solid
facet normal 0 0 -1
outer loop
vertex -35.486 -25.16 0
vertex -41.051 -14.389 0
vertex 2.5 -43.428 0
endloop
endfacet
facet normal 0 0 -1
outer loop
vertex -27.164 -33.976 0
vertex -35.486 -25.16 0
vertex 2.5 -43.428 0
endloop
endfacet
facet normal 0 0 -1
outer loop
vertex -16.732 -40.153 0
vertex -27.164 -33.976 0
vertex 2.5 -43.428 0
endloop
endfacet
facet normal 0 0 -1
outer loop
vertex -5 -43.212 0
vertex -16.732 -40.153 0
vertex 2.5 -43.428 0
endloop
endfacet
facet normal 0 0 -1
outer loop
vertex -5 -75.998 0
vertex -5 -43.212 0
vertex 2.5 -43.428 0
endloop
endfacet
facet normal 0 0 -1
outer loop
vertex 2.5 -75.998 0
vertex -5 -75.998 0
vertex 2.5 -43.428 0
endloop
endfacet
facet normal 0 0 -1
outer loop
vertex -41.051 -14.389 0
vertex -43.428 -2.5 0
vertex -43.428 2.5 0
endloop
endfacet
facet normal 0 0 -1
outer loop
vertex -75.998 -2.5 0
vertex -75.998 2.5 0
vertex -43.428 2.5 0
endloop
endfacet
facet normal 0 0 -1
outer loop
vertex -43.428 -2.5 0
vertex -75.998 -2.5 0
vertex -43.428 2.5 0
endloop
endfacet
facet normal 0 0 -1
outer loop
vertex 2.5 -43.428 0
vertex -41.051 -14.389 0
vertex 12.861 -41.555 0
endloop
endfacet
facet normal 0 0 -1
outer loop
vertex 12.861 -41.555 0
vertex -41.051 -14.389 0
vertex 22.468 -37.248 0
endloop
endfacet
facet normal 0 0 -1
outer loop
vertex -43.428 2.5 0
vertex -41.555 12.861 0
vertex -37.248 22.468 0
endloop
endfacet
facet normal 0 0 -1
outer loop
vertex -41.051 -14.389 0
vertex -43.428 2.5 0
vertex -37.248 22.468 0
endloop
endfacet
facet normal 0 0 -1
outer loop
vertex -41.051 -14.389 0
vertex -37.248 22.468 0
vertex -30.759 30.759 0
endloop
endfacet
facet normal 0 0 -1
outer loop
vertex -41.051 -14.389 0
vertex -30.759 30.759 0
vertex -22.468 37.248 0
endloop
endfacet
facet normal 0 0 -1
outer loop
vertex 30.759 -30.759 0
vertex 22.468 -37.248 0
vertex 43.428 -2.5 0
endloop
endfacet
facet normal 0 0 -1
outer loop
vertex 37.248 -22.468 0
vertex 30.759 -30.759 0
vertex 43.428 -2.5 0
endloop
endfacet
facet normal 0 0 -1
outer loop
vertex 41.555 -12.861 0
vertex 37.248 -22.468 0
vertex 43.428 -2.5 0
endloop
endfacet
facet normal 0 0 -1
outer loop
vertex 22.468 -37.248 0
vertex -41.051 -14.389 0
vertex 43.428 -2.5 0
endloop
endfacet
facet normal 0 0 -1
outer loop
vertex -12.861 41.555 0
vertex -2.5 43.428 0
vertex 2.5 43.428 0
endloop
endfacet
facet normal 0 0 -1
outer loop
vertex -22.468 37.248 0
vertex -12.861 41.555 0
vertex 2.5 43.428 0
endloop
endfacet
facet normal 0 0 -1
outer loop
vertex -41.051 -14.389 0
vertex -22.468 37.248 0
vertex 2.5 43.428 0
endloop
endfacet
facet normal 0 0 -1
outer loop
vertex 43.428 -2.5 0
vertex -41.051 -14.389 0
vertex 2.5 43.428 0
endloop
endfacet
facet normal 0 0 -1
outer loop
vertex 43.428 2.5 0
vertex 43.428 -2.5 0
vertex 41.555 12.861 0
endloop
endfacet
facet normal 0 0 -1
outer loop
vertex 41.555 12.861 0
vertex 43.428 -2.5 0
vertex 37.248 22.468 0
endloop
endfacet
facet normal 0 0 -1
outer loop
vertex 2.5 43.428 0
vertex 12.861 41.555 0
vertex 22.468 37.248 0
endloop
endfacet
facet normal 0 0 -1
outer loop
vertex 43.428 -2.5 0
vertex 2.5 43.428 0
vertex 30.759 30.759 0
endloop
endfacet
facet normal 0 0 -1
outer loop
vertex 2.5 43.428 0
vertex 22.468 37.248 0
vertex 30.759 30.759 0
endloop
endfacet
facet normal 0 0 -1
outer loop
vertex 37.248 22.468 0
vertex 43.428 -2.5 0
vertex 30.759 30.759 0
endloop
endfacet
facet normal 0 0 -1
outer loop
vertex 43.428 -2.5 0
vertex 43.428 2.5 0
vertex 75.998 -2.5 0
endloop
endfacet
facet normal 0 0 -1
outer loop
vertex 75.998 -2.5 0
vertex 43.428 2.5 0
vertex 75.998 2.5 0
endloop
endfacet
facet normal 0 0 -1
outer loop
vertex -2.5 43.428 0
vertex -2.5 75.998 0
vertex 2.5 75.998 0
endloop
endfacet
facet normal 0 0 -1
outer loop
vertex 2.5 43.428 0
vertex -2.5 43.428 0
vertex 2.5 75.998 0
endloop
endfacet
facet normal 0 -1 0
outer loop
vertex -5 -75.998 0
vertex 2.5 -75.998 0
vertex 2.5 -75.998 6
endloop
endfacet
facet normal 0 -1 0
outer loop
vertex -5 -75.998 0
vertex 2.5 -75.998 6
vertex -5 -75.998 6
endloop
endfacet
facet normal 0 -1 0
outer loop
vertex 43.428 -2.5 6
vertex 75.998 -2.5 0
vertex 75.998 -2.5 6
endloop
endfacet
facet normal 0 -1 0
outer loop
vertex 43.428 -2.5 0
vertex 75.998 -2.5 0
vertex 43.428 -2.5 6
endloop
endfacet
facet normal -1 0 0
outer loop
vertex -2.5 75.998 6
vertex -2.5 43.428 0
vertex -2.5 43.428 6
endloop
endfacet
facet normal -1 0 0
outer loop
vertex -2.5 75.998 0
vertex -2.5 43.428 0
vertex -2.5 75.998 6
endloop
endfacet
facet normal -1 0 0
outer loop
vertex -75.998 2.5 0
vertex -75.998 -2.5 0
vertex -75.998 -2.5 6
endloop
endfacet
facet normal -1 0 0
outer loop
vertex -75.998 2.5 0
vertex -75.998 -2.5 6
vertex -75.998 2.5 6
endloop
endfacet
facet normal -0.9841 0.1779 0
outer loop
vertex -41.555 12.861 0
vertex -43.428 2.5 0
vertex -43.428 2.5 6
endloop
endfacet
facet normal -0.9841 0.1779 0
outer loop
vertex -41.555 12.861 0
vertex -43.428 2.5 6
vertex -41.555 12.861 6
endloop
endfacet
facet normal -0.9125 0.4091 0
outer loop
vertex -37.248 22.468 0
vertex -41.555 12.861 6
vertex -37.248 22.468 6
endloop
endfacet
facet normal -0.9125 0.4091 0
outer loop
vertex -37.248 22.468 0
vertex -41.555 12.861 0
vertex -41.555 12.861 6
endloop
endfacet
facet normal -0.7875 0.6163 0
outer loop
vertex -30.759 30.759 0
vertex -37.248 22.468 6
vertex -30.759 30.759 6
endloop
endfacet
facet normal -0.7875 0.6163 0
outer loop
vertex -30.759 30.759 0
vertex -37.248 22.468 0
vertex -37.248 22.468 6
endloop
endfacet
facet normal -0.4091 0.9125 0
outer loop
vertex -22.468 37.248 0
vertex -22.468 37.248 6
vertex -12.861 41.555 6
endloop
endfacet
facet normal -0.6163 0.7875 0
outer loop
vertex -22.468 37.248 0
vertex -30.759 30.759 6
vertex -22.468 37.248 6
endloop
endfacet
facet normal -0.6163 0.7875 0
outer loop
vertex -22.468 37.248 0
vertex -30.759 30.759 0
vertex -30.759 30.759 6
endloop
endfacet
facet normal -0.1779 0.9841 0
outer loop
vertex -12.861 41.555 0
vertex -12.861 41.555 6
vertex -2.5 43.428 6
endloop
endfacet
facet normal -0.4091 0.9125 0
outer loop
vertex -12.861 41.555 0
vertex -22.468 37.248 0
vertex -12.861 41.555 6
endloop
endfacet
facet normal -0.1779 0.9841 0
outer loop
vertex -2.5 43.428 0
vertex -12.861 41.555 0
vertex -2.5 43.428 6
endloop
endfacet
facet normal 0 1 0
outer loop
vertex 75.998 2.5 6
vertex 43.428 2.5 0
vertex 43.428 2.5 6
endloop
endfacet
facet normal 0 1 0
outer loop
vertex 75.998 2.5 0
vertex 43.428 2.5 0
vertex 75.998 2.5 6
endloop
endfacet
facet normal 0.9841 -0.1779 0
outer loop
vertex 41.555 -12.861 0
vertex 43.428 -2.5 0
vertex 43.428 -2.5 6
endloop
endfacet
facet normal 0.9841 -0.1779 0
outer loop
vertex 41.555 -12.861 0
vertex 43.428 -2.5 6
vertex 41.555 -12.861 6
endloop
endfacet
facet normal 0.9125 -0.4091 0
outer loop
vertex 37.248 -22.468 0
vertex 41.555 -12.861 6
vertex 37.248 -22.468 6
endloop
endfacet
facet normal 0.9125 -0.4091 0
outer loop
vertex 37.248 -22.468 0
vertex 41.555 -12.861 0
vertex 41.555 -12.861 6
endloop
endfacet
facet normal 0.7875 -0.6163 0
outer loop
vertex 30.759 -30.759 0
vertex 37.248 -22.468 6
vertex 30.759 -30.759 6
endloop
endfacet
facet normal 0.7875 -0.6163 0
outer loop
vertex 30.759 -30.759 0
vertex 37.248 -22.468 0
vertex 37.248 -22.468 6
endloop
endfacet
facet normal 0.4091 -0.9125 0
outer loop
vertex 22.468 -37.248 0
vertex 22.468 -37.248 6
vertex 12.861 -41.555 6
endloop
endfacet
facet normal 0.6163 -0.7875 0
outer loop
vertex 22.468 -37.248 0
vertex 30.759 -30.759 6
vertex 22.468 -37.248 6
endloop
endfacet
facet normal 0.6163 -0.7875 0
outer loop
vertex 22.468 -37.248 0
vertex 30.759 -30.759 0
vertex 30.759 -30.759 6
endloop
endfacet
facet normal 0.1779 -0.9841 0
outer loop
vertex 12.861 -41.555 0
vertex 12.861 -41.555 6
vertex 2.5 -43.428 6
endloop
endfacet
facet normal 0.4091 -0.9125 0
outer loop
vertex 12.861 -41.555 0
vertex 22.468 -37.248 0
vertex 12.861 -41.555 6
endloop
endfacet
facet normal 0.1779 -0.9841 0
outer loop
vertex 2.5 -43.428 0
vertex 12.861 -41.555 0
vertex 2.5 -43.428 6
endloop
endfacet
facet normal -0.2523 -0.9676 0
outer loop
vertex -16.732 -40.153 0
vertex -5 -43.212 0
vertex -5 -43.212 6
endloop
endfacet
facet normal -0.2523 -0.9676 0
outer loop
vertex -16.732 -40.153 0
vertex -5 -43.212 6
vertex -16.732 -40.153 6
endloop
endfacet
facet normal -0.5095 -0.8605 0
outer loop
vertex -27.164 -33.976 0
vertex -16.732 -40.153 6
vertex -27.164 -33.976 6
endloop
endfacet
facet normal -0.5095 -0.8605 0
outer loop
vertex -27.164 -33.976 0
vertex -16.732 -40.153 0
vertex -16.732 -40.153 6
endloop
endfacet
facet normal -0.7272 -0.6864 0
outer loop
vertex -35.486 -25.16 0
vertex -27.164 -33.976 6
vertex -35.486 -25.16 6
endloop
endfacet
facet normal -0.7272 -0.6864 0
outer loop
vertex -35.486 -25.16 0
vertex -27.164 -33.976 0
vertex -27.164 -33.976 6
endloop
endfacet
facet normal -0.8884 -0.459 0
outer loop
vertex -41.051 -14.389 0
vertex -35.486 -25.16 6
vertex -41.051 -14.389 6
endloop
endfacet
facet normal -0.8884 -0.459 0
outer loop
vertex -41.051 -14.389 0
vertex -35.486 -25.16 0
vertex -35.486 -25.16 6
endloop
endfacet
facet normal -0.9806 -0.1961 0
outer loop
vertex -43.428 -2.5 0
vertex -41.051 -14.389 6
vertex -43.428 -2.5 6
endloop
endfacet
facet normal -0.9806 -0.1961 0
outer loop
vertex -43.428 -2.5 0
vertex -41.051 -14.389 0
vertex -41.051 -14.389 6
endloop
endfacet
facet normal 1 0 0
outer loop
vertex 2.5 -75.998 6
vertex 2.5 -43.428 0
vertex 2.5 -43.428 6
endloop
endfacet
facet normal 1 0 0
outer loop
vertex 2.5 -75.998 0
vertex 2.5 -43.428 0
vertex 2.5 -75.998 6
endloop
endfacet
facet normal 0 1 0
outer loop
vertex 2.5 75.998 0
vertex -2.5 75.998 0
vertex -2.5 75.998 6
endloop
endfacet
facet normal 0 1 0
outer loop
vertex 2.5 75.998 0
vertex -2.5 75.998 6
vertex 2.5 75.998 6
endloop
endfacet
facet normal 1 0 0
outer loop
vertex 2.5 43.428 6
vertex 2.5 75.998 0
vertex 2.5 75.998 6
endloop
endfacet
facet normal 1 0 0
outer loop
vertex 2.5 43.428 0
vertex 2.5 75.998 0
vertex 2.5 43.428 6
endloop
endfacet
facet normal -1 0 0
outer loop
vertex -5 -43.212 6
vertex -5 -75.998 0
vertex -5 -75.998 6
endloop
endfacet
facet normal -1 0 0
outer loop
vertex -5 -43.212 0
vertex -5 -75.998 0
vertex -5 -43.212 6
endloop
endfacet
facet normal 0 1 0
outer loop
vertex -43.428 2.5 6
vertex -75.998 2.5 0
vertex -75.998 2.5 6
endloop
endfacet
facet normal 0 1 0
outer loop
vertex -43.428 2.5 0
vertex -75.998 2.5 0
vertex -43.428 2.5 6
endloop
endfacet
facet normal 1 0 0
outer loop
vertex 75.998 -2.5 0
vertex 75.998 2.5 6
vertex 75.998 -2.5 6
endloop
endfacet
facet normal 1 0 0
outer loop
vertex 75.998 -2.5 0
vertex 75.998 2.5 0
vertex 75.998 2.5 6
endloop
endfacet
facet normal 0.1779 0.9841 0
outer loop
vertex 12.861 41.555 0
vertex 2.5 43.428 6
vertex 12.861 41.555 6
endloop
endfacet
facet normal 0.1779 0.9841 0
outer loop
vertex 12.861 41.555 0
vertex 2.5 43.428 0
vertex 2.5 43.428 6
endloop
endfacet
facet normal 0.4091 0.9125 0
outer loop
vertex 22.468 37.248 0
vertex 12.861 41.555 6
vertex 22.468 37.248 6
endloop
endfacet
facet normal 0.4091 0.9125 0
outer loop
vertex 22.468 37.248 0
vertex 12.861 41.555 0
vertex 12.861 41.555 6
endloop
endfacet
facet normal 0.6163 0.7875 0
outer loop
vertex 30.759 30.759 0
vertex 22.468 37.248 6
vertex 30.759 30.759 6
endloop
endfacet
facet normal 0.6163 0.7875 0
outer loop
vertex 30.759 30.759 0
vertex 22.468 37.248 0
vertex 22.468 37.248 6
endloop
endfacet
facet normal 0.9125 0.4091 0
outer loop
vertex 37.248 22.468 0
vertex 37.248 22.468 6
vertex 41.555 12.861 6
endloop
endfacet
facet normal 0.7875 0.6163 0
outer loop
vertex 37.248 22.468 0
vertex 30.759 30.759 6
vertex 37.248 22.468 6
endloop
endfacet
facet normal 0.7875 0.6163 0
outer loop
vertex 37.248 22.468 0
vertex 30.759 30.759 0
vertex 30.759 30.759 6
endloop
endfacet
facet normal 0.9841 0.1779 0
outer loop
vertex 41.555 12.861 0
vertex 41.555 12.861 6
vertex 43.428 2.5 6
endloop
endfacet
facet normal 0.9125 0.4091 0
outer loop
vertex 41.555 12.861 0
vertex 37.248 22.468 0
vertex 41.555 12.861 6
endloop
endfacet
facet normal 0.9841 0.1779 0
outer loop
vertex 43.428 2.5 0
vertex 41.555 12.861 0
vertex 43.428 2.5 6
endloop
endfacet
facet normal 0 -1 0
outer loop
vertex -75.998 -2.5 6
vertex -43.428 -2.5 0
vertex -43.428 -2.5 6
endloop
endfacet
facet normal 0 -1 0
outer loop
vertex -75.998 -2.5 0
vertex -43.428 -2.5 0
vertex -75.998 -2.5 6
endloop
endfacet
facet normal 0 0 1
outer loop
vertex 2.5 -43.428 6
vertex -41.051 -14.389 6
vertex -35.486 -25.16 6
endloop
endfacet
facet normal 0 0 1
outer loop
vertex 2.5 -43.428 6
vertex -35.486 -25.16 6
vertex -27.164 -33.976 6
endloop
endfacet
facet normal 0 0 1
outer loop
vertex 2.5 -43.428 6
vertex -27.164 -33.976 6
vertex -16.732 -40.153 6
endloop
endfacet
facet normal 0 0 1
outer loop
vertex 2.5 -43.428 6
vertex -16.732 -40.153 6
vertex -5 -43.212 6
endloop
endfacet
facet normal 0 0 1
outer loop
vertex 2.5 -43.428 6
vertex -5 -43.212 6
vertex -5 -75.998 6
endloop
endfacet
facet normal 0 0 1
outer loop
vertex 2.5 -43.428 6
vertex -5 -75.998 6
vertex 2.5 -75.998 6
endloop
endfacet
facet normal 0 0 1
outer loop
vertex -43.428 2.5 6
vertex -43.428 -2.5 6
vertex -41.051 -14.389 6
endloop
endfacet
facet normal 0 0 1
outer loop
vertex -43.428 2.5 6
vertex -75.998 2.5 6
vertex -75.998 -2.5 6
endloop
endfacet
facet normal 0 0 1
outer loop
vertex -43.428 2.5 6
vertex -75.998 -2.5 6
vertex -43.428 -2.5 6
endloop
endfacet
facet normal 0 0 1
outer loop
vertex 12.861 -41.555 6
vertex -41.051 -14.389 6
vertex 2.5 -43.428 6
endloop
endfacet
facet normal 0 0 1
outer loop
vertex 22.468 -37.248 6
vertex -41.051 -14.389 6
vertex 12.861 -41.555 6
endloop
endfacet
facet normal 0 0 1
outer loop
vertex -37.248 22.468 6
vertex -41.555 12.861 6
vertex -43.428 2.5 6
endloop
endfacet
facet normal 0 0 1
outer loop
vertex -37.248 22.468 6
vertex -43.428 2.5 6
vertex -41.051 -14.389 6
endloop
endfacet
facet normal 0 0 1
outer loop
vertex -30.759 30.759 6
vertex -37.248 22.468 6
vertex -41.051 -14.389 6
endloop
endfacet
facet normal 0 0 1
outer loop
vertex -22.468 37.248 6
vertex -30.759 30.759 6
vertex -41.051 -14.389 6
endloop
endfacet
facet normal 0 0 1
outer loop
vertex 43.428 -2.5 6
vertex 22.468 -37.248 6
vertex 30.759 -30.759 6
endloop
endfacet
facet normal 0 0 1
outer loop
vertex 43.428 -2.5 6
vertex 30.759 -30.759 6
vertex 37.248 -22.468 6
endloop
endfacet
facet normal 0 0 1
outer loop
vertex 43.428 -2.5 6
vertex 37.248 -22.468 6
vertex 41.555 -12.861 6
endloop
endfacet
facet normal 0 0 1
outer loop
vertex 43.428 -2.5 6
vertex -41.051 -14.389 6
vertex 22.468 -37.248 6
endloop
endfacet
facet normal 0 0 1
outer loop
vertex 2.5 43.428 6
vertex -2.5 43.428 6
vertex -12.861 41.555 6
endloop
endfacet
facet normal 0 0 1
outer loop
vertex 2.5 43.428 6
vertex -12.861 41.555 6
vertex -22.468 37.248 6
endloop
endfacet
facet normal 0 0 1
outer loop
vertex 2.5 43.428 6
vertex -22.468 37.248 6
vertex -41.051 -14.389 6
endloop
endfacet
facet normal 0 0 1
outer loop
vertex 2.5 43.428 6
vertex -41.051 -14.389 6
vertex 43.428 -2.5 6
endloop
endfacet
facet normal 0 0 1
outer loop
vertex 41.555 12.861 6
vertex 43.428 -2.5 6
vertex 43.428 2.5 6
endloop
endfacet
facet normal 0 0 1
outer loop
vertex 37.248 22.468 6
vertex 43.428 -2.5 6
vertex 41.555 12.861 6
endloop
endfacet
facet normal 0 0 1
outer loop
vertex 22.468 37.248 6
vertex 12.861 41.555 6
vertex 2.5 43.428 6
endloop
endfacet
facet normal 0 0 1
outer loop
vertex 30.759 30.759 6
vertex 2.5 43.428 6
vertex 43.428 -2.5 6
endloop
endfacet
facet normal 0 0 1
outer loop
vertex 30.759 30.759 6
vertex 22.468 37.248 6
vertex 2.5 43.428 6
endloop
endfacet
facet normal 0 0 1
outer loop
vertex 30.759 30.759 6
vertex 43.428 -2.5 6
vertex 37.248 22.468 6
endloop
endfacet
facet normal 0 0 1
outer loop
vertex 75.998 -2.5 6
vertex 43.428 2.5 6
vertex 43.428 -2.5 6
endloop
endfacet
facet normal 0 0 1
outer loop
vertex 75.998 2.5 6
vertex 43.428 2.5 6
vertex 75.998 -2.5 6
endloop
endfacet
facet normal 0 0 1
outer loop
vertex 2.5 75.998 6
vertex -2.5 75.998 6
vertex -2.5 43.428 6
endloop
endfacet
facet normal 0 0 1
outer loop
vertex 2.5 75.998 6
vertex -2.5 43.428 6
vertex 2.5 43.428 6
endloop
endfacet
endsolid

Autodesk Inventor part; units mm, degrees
ref_plane "YZ Plane" through (0, 0, 0) normal (1, 0, 0) x (0, 1, 0)
ref_plane "XZ Plane" through (0, 0, 0) normal (0, 1, 0) x (-1, 0, 0)
ref_plane "XY Plane" through (0, 0, 0) normal (0, 0, 1) x (1, 0, 0)
sketch "Szkic1" plane through (0, 0, 0) normal (0, 0, 1) x (1, 0, 0)
  circle A0 centre (0, 0) radius 43.5 construction
  line L0 (0, 43.5) -> (2.5, 43.5) construction
  line L1 (2.5, 43.5) -> (2.5, 75.9975) construction
  line L2 (2.5, 75.9975) -> (0, 75.9975) construction
  line L3 (0, 75.9975) -> (0, 43.5) construction
  line L4 (0, -43.5) -> (2.5, -43.5) construction
  line L5 (2.5, -43.5) -> (2.5, -75.9975) construction
  line L6 (2.5, -75.9975) -> (0, -75.9975) construction
  line L7 (43.5, 0) -> (75.9975, 0) construction
  line L8 (75.9975, 0) -> (75.9975, 2.5) construction
  line L9 (75.9975, 2.5) -> (43.5, 2.5) construction
  line L10 (43.5, 2.5) -> (43.5, 0) construction
  line L11 (43.5, 0) -> (75.9975, 0) construction
  line L12 (75.9975, 0) -> (75.9975, -2.5) construction
  line L13 (75.9975, -2.5) -> (43.5, -2.5) construction
  line L14 (43.5, -2.5) -> (43.5, 0) construction
  line L15 (0, 43.5) -> (-2.5, 43.5) construction
  line L16 (-2.5, 43.5) -> (-2.5, 75.9975) construction
  line L17 (-2.5, 75.9975) -> (0, 75.9975) construction
  line L18 (0, 75.9975) -> (0, 43.5) construction
  line L19 (0, -43.5) -> (-5, -43.5) construction
  line L20 (-5, -43.5) -> (-5, -75.9975) construction
  line L21 (-5, -75.9975) -> (-2.5, -75.9975) construction
  line L22 (-43.5, 0) -> (-75.9975, 0) construction
  line L23 (-75.9975, 0) -> (-75.9975, -2.5) construction
  line L24 (-75.9975, -2.5) -> (-43.5, -2.5) construction
  line L25 (-43.5, -2.5) -> (-43.5, 0) construction
  line L26 (-43.5, 0) -> (-75.9975, 0) construction
  line L27 (-75.9975, 0) -> (-75.9975, 2.5) construction
  line L28 (-75.9975, 2.5) -> (-43.5, 2.5) construction
  line L29 (-43.5, 2.5) -> (-43.5, 0) construction
  arc A1 (2.5, -43.4281) -> (43.4281, -2.5) centre (0, 0) ccw
  arc A2 (43.4281, 2.5) -> (2.5, 43.4281) centre (0, 0) ccw
  arc A3 (-43.4281, -2.5) -> (-5, -43.2117) centre (0, 0) ccw
  arc A4 (-2.5, 43.4281) -> (-43.4281, 2.5) centre (0, 0) ccw
  line L30 (-2.5, 43.4281) -> (-2.5, 75.9975)
  line L31 (-2.5, 75.9975) -> (2.5, 75.9975)
  line L32 (2.5, 75.9975) -> (2.5, 43.4281)
  line L33 (43.4281, 2.5) -> (75.9975, 2.5)
  line L34 (75.9975, 2.5) -> (75.9975, -2.5)
  line L35 (75.9975, -2.5) -> (43.4281, -2.5)
  line L36 (2.5, -43.4281) -> (2.5, -75.9975)
  line L37 (2.5, -75.9975) -> (-5, -75.9975)
  line L38 (-5, -75.9975) -> (-5, -43.2117)
  line L39 (-43.4281, -2.5) -> (-75.9975, -2.5)
  line L40 (-75.9975, -2.5) -> (-75.9975, 2.5)
  line L41 (-75.9975, 2.5) -> (-43.4281, 2.5)
  dimension "d0" = 87
  dimension "d1" = 2.5
  dimension "d3" = 2.5
  dimension "d6" = 2.5
  dimension "d7" = 2.5
  dimension "d8" = 2.5
  dimension "d9" = 2.5
  dimension "d11" = 2.5
  dimension "d12" = 2.5
  dimension "d15" = 75.9975
  dimension "d16" = 75.9975
  dimension "d17" = 75.9975
  dimension "d19" = 75.9975
extrude "Wyciągnięcie proste1" add sketch "Szkic1" along normal blind 6
equation "\"d1\" = d11"
equation "\"d3\" = d11"
equation "\"d6\" = d11"
equation "\"d7\" = d11"
equation "\"d8\" = d11"
equation "\"d9\" = d11"
equation "\"d12\" = d11"
equation "\"d16\" = d15"
equation "\"d17\" = d15"
equation "\"d19\" = d15"
properties part number "Zamek_II_klucz"
